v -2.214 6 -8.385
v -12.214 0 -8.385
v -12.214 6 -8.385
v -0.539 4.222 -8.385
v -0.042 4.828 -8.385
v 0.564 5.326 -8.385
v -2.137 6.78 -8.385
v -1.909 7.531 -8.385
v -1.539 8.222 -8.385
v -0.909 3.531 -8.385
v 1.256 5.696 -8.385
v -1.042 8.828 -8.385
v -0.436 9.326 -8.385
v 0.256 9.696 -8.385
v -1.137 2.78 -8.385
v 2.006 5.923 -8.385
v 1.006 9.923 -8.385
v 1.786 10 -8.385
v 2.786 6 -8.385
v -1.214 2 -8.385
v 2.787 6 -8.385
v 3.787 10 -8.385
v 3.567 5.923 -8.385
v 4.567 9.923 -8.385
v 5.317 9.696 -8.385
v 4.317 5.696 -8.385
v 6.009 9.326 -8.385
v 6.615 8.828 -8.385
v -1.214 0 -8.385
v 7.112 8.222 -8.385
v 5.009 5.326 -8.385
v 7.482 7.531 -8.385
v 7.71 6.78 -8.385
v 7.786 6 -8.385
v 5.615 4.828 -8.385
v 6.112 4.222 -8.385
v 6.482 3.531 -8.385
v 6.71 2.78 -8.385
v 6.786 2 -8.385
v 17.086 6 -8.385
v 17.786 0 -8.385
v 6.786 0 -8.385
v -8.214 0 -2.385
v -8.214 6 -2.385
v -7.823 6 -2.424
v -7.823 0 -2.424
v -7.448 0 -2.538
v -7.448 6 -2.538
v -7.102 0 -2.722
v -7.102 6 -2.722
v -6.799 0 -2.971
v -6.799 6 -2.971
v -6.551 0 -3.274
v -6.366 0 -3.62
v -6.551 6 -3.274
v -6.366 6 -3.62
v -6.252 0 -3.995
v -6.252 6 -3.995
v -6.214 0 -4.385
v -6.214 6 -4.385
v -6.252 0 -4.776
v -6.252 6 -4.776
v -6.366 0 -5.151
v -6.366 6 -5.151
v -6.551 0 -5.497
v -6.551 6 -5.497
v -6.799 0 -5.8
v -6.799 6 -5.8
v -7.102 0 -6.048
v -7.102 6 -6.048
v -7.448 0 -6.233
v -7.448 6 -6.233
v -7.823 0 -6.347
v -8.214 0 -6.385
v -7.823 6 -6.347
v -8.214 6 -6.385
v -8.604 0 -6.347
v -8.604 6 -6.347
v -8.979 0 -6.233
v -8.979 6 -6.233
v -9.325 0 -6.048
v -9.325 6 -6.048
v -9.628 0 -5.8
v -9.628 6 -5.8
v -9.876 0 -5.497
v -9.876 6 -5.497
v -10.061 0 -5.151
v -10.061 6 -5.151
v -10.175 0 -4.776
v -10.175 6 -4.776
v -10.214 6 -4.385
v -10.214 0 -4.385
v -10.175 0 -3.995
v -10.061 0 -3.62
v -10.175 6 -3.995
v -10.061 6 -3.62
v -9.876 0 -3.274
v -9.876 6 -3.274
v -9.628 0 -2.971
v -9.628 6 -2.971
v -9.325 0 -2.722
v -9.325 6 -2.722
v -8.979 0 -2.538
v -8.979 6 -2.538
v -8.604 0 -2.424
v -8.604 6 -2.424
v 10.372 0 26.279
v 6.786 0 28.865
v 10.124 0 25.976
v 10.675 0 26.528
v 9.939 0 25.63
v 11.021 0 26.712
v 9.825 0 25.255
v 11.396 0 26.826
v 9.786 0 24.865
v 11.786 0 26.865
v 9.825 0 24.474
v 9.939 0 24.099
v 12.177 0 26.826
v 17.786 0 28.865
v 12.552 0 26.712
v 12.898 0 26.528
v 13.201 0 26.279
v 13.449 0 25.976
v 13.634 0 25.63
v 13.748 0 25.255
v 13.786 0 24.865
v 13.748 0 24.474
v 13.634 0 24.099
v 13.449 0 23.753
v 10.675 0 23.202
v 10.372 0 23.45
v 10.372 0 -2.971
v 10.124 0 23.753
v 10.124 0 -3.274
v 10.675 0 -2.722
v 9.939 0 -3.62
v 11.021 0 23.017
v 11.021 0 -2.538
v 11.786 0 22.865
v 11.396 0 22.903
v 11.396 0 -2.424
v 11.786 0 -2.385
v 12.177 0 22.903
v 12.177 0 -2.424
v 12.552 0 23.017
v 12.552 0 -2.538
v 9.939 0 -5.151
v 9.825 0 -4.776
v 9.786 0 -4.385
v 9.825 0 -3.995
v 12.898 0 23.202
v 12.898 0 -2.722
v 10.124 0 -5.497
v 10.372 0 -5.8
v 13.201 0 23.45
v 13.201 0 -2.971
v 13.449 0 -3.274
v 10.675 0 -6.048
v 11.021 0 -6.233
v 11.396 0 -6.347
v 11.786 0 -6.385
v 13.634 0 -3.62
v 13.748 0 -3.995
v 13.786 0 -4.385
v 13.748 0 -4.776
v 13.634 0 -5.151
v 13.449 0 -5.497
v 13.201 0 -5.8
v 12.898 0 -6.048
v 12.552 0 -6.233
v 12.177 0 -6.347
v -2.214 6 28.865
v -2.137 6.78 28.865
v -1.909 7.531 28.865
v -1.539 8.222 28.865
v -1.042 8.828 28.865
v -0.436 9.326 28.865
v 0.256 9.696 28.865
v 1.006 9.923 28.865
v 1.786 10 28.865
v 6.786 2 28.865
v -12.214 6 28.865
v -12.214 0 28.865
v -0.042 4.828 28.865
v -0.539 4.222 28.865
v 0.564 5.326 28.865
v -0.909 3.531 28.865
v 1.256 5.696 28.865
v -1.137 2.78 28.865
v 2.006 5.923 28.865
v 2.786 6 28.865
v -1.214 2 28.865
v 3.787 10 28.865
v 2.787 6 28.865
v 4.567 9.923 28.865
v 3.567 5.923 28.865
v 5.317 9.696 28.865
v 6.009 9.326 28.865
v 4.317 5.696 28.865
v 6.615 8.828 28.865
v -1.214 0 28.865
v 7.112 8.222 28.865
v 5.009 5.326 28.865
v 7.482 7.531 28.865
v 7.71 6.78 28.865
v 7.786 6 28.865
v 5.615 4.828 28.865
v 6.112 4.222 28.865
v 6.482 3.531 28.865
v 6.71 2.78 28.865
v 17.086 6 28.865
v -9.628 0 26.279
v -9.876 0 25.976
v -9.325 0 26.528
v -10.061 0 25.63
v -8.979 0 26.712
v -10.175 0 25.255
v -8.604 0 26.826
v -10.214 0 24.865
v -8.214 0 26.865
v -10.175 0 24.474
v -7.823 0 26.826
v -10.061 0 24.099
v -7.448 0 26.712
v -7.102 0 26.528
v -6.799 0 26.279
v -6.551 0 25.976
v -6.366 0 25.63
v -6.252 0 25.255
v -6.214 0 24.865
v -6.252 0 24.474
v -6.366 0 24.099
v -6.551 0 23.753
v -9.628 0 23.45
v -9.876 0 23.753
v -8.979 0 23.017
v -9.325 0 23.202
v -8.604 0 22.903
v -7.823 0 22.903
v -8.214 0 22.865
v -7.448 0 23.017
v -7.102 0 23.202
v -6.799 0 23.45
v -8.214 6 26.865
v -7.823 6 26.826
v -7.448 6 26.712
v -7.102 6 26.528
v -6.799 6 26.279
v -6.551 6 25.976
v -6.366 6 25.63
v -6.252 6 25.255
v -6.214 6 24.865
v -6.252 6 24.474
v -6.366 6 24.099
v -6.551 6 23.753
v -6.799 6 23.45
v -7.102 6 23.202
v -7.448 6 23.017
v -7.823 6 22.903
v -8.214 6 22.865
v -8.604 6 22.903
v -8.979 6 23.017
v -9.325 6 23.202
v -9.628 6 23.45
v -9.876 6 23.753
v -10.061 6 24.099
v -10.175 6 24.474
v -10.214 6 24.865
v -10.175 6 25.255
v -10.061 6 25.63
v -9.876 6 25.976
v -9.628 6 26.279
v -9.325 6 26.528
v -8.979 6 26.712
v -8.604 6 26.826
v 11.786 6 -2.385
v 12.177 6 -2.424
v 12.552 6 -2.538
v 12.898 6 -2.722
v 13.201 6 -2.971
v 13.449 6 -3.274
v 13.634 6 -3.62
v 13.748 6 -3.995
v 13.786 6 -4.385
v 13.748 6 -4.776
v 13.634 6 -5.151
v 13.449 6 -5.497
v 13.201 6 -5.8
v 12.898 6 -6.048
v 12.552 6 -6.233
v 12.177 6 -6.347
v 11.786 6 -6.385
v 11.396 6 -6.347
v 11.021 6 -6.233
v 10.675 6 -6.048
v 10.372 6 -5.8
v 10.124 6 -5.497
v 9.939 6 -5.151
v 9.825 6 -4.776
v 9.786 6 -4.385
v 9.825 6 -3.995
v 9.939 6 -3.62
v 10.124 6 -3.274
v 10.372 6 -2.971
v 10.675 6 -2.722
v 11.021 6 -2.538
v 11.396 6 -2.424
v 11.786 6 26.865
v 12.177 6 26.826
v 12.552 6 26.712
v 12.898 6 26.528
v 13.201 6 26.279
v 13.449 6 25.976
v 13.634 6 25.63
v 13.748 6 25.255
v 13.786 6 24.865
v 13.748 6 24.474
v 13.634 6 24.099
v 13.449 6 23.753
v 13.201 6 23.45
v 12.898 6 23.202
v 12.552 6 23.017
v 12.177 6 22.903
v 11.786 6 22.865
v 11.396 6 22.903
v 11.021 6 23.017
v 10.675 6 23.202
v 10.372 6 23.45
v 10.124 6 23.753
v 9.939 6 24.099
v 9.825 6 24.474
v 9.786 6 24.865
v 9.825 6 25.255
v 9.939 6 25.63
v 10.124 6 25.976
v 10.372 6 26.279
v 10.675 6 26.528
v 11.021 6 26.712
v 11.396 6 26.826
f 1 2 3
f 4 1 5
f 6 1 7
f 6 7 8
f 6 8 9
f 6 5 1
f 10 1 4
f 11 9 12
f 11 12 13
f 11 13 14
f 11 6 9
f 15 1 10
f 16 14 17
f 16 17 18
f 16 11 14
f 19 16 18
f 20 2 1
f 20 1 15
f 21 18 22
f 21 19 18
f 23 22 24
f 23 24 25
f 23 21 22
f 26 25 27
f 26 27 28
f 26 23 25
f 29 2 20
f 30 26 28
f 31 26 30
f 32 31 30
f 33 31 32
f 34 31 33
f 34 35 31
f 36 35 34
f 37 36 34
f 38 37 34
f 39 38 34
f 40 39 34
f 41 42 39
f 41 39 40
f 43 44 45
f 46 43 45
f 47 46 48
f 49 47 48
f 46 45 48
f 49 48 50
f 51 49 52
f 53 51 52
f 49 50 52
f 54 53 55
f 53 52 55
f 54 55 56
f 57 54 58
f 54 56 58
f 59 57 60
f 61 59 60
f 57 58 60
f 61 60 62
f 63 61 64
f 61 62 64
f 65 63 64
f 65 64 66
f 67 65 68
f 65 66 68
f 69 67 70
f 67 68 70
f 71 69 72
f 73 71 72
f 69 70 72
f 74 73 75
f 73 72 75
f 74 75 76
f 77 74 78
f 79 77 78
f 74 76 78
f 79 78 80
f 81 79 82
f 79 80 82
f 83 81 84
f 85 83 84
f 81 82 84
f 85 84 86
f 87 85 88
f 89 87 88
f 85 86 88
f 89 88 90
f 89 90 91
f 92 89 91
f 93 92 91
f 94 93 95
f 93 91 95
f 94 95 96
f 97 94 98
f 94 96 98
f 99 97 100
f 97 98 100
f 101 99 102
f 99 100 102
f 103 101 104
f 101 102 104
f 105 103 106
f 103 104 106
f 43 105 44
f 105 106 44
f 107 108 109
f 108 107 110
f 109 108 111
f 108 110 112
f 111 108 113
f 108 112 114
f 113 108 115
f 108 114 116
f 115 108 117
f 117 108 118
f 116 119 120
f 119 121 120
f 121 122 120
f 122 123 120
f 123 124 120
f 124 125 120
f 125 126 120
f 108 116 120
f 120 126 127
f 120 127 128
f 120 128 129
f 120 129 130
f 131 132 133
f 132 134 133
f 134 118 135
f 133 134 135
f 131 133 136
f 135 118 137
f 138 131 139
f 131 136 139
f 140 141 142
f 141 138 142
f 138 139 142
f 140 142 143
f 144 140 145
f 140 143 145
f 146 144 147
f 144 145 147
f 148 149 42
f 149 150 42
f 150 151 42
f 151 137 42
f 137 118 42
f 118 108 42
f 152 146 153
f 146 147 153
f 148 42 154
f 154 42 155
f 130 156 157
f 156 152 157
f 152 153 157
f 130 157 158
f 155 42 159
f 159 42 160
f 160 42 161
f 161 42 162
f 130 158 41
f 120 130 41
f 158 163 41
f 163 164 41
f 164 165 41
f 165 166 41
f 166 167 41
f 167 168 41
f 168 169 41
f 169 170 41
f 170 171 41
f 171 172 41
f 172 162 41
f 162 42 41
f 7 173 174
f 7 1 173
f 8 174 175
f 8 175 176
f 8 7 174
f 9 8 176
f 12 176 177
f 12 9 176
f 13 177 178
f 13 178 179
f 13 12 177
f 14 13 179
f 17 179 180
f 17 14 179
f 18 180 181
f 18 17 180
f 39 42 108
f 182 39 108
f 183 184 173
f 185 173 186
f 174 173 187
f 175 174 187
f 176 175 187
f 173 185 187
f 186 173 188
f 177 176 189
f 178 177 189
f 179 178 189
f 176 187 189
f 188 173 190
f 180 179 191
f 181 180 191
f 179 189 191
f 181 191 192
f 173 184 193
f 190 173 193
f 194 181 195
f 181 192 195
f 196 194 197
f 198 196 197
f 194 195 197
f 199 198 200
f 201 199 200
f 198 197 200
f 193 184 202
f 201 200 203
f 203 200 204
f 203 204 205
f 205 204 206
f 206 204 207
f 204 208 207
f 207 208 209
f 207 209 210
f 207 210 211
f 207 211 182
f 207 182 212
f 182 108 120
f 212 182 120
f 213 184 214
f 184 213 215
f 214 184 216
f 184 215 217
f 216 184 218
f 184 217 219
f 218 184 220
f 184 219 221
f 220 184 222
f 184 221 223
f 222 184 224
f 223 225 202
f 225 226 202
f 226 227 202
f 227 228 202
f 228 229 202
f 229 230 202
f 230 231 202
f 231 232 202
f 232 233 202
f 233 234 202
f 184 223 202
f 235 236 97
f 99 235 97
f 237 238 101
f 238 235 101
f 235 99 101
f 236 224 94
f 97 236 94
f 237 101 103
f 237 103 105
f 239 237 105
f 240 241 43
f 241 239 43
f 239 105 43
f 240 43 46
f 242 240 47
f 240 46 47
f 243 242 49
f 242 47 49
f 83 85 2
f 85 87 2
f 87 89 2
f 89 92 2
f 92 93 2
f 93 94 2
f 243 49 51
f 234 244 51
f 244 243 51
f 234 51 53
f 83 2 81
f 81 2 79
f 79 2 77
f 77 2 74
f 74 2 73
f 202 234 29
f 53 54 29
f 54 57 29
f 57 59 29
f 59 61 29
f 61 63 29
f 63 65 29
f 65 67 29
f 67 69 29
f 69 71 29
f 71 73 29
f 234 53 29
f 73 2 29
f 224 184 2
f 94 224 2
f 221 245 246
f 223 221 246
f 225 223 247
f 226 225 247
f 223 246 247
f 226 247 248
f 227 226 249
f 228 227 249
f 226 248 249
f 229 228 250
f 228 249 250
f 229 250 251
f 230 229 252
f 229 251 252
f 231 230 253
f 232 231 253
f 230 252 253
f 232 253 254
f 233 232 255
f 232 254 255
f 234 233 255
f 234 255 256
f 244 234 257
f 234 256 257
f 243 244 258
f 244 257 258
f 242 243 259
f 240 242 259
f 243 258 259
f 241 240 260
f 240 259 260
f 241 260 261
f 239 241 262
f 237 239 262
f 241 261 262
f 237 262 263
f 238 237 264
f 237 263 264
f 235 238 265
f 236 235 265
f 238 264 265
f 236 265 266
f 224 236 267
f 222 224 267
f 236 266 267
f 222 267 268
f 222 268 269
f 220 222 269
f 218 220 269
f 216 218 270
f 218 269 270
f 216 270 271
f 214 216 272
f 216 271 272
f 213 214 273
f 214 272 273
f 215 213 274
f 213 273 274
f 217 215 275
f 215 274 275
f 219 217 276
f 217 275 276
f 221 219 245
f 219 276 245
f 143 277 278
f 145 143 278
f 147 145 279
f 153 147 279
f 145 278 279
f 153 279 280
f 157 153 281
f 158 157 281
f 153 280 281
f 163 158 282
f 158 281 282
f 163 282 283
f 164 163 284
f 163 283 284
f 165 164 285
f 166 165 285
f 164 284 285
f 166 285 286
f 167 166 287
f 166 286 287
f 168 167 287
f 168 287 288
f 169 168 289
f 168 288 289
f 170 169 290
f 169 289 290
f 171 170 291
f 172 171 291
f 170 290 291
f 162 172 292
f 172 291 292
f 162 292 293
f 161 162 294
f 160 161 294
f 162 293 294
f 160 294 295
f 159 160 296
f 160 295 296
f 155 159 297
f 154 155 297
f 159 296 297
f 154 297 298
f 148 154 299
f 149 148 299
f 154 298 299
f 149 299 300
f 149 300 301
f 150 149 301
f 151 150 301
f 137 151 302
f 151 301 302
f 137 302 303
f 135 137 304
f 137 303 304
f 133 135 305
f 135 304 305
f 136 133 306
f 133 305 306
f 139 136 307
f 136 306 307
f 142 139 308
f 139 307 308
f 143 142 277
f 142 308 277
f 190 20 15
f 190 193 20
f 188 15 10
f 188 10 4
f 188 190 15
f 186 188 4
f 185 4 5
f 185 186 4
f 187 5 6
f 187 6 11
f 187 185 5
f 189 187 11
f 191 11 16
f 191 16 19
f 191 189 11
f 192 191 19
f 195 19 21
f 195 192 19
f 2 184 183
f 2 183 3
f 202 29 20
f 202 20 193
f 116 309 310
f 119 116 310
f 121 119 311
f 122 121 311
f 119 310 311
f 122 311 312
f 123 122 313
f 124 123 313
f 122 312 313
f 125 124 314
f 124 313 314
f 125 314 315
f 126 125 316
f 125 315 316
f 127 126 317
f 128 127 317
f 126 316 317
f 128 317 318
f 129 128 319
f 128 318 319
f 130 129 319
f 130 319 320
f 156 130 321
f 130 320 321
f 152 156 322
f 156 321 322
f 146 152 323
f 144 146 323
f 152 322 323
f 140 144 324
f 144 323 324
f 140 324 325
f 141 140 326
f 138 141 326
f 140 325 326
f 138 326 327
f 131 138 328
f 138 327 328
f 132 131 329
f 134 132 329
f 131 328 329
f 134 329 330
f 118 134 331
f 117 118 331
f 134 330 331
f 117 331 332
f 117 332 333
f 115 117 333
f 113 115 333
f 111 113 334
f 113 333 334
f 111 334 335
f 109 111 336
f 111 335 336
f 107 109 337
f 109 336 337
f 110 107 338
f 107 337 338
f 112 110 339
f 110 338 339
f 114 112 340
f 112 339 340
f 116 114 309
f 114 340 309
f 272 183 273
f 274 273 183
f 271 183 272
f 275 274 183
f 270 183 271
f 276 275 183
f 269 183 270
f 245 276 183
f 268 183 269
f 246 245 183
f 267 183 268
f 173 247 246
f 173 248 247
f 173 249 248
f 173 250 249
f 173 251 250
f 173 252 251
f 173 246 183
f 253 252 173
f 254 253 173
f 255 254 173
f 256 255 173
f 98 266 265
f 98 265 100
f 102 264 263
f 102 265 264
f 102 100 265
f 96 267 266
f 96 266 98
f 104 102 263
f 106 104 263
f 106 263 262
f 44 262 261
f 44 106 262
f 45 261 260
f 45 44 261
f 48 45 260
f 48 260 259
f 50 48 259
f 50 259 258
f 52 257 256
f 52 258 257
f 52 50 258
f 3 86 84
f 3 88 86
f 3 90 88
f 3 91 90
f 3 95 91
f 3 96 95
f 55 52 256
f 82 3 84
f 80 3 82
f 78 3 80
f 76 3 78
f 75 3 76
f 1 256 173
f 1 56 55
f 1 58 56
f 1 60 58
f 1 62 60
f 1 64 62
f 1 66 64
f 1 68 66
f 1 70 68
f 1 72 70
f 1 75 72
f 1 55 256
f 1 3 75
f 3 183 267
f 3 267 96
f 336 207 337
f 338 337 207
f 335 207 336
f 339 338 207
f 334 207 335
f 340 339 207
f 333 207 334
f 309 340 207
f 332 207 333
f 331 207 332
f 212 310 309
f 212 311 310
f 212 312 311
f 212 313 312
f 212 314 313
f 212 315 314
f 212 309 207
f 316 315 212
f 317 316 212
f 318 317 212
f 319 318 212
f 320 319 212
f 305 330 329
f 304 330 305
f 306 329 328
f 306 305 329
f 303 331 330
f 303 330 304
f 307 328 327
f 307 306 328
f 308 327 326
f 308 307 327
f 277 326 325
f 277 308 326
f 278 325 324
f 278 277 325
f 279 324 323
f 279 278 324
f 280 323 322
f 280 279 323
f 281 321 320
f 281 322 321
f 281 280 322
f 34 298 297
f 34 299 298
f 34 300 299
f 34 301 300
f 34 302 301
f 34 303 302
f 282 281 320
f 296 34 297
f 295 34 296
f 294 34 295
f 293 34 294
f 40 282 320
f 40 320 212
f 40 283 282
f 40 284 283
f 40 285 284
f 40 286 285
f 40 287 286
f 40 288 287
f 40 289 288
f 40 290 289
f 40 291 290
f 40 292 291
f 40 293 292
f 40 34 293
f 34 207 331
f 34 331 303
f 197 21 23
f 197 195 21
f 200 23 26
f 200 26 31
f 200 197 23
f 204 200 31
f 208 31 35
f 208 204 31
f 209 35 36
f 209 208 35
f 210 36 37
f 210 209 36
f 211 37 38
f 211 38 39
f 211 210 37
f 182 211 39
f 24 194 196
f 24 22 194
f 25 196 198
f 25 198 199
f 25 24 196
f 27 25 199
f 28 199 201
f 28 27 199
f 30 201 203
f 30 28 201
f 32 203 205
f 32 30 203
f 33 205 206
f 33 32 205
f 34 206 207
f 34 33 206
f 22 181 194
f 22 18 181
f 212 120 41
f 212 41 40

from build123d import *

# Parameters (mm, degrees)
SKETCH1_W           = 30
SKETCH1_H           = 37.25
BOSS_EXTRUDE1_DEPTH = 6
SKETCH2_R           = 2
CUT_EXTRUDE1_DEPTH  = 6
SKETCH3_W           = 10
SKETCH3_H           = 37.25
BOSS_EXTRUDE2_DEPTH = 4
SKETCH4_W           = 8
SKETCH4_H           = 37.25
CUT_EXTRUDE2_DEPTH  = 6
FILLET2_R           = 4
FILLET3_R           = 4
CUT_EXTRUDE3_DEPTH  = 50


with BuildPart() as part:
    # Sketch1 → Boss-Extrude1 (new body)
    with BuildSketch(Plane(origin=(0, 0, 0), x_dir=(1, 0, 0), z_dir=(0, 1, 0))):
        with Locations((2.786458333, -10.239583333)):
            Rectangle(SKETCH1_W, SKETCH1_H)
    extrude(amount=BOSS_EXTRUDE1_DEPTH)

    # Sketch2 → Cut-Extrude1 (cut)
    with BuildSketch(Plane(origin=(0, 6, 0), x_dir=(1, 0, 0), z_dir=(0, 1, 0))):
        with Locations(Location((-8.213541667, -24.864583333, 0), (0, 0, 270))):
            Circle(SKETCH2_R)
        with Locations(Location((11.786458333, 4.385416667, 0), (0, 0, 270))):
            Circle(SKETCH2_R)
        with Locations(Location((11.786458333, -24.864583333, 0), (0, 0, 270))):
            Circle(SKETCH2_R)
        with Locations(Location((-8.213541667, 4.385416667, 0), (0, 0, 270))):
            Circle(SKETCH2_R)
    extrude(amount=-CUT_EXTRUDE1_DEPTH, mode=Mode.SUBTRACT)

    # Sketch3 → Boss-Extrude2 (add)
    with BuildSketch(Plane(origin=(0, 6, 0), x_dir=(1, 0, 0), z_dir=(0, 1, 0))):
        with Locations((2.786458333, -10.239583333)):
            Rectangle(SKETCH3_W, SKETCH3_H)
    extrude(amount=BOSS_EXTRUDE2_DEPTH)

    # Sketch4 → Cut-Extrude2 (cut)
    with BuildSketch(Plane.XZ):
        with Locations((2.786458333, 10.239583333)):
            Rectangle(SKETCH4_W, SKETCH4_H)
    extrude(amount=-CUT_EXTRUDE2_DEPTH, mode=Mode.SUBTRACT)

    # Fillet2
    fillet2_edges = [part.edges().sort_by_distance(p)[0] for p in [
        (6.786458333, 6, 10.239583333),
        (-1.213541667, 6, 10.239583333),
    ]]
    fillet(fillet2_edges, radius=FILLET2_R - 0.0001)  # a hair under: the kernel refuses the full size

    # Fillet3
    fillet3_edges = [part.edges().sort_by_distance(p)[0] for p in [
        (7.786458333, 10, 10.239583333),
        (-2.213541667, 10, 10.239583333),
    ]]
    fillet(fillet3_edges, radius=FILLET3_R - 0.0001)  # a hair under: the kernel refuses the full size

    # Sketch5 → Cut-Extrude3 (cut)
    with BuildSketch(Plane(origin=(0, 0, -8.385416667), x_dir=(-1, 0, 0), z_dir=(0, 0, -1))):
        Polygon((-17.786458333, 0), (-17.085914813, 6), (-17.786458333, 6), align=None)
    extrude(amount=-CUT_EXTRUDE3_DEPTH, mode=Mode.SUBTRACT)


solid = part.part
